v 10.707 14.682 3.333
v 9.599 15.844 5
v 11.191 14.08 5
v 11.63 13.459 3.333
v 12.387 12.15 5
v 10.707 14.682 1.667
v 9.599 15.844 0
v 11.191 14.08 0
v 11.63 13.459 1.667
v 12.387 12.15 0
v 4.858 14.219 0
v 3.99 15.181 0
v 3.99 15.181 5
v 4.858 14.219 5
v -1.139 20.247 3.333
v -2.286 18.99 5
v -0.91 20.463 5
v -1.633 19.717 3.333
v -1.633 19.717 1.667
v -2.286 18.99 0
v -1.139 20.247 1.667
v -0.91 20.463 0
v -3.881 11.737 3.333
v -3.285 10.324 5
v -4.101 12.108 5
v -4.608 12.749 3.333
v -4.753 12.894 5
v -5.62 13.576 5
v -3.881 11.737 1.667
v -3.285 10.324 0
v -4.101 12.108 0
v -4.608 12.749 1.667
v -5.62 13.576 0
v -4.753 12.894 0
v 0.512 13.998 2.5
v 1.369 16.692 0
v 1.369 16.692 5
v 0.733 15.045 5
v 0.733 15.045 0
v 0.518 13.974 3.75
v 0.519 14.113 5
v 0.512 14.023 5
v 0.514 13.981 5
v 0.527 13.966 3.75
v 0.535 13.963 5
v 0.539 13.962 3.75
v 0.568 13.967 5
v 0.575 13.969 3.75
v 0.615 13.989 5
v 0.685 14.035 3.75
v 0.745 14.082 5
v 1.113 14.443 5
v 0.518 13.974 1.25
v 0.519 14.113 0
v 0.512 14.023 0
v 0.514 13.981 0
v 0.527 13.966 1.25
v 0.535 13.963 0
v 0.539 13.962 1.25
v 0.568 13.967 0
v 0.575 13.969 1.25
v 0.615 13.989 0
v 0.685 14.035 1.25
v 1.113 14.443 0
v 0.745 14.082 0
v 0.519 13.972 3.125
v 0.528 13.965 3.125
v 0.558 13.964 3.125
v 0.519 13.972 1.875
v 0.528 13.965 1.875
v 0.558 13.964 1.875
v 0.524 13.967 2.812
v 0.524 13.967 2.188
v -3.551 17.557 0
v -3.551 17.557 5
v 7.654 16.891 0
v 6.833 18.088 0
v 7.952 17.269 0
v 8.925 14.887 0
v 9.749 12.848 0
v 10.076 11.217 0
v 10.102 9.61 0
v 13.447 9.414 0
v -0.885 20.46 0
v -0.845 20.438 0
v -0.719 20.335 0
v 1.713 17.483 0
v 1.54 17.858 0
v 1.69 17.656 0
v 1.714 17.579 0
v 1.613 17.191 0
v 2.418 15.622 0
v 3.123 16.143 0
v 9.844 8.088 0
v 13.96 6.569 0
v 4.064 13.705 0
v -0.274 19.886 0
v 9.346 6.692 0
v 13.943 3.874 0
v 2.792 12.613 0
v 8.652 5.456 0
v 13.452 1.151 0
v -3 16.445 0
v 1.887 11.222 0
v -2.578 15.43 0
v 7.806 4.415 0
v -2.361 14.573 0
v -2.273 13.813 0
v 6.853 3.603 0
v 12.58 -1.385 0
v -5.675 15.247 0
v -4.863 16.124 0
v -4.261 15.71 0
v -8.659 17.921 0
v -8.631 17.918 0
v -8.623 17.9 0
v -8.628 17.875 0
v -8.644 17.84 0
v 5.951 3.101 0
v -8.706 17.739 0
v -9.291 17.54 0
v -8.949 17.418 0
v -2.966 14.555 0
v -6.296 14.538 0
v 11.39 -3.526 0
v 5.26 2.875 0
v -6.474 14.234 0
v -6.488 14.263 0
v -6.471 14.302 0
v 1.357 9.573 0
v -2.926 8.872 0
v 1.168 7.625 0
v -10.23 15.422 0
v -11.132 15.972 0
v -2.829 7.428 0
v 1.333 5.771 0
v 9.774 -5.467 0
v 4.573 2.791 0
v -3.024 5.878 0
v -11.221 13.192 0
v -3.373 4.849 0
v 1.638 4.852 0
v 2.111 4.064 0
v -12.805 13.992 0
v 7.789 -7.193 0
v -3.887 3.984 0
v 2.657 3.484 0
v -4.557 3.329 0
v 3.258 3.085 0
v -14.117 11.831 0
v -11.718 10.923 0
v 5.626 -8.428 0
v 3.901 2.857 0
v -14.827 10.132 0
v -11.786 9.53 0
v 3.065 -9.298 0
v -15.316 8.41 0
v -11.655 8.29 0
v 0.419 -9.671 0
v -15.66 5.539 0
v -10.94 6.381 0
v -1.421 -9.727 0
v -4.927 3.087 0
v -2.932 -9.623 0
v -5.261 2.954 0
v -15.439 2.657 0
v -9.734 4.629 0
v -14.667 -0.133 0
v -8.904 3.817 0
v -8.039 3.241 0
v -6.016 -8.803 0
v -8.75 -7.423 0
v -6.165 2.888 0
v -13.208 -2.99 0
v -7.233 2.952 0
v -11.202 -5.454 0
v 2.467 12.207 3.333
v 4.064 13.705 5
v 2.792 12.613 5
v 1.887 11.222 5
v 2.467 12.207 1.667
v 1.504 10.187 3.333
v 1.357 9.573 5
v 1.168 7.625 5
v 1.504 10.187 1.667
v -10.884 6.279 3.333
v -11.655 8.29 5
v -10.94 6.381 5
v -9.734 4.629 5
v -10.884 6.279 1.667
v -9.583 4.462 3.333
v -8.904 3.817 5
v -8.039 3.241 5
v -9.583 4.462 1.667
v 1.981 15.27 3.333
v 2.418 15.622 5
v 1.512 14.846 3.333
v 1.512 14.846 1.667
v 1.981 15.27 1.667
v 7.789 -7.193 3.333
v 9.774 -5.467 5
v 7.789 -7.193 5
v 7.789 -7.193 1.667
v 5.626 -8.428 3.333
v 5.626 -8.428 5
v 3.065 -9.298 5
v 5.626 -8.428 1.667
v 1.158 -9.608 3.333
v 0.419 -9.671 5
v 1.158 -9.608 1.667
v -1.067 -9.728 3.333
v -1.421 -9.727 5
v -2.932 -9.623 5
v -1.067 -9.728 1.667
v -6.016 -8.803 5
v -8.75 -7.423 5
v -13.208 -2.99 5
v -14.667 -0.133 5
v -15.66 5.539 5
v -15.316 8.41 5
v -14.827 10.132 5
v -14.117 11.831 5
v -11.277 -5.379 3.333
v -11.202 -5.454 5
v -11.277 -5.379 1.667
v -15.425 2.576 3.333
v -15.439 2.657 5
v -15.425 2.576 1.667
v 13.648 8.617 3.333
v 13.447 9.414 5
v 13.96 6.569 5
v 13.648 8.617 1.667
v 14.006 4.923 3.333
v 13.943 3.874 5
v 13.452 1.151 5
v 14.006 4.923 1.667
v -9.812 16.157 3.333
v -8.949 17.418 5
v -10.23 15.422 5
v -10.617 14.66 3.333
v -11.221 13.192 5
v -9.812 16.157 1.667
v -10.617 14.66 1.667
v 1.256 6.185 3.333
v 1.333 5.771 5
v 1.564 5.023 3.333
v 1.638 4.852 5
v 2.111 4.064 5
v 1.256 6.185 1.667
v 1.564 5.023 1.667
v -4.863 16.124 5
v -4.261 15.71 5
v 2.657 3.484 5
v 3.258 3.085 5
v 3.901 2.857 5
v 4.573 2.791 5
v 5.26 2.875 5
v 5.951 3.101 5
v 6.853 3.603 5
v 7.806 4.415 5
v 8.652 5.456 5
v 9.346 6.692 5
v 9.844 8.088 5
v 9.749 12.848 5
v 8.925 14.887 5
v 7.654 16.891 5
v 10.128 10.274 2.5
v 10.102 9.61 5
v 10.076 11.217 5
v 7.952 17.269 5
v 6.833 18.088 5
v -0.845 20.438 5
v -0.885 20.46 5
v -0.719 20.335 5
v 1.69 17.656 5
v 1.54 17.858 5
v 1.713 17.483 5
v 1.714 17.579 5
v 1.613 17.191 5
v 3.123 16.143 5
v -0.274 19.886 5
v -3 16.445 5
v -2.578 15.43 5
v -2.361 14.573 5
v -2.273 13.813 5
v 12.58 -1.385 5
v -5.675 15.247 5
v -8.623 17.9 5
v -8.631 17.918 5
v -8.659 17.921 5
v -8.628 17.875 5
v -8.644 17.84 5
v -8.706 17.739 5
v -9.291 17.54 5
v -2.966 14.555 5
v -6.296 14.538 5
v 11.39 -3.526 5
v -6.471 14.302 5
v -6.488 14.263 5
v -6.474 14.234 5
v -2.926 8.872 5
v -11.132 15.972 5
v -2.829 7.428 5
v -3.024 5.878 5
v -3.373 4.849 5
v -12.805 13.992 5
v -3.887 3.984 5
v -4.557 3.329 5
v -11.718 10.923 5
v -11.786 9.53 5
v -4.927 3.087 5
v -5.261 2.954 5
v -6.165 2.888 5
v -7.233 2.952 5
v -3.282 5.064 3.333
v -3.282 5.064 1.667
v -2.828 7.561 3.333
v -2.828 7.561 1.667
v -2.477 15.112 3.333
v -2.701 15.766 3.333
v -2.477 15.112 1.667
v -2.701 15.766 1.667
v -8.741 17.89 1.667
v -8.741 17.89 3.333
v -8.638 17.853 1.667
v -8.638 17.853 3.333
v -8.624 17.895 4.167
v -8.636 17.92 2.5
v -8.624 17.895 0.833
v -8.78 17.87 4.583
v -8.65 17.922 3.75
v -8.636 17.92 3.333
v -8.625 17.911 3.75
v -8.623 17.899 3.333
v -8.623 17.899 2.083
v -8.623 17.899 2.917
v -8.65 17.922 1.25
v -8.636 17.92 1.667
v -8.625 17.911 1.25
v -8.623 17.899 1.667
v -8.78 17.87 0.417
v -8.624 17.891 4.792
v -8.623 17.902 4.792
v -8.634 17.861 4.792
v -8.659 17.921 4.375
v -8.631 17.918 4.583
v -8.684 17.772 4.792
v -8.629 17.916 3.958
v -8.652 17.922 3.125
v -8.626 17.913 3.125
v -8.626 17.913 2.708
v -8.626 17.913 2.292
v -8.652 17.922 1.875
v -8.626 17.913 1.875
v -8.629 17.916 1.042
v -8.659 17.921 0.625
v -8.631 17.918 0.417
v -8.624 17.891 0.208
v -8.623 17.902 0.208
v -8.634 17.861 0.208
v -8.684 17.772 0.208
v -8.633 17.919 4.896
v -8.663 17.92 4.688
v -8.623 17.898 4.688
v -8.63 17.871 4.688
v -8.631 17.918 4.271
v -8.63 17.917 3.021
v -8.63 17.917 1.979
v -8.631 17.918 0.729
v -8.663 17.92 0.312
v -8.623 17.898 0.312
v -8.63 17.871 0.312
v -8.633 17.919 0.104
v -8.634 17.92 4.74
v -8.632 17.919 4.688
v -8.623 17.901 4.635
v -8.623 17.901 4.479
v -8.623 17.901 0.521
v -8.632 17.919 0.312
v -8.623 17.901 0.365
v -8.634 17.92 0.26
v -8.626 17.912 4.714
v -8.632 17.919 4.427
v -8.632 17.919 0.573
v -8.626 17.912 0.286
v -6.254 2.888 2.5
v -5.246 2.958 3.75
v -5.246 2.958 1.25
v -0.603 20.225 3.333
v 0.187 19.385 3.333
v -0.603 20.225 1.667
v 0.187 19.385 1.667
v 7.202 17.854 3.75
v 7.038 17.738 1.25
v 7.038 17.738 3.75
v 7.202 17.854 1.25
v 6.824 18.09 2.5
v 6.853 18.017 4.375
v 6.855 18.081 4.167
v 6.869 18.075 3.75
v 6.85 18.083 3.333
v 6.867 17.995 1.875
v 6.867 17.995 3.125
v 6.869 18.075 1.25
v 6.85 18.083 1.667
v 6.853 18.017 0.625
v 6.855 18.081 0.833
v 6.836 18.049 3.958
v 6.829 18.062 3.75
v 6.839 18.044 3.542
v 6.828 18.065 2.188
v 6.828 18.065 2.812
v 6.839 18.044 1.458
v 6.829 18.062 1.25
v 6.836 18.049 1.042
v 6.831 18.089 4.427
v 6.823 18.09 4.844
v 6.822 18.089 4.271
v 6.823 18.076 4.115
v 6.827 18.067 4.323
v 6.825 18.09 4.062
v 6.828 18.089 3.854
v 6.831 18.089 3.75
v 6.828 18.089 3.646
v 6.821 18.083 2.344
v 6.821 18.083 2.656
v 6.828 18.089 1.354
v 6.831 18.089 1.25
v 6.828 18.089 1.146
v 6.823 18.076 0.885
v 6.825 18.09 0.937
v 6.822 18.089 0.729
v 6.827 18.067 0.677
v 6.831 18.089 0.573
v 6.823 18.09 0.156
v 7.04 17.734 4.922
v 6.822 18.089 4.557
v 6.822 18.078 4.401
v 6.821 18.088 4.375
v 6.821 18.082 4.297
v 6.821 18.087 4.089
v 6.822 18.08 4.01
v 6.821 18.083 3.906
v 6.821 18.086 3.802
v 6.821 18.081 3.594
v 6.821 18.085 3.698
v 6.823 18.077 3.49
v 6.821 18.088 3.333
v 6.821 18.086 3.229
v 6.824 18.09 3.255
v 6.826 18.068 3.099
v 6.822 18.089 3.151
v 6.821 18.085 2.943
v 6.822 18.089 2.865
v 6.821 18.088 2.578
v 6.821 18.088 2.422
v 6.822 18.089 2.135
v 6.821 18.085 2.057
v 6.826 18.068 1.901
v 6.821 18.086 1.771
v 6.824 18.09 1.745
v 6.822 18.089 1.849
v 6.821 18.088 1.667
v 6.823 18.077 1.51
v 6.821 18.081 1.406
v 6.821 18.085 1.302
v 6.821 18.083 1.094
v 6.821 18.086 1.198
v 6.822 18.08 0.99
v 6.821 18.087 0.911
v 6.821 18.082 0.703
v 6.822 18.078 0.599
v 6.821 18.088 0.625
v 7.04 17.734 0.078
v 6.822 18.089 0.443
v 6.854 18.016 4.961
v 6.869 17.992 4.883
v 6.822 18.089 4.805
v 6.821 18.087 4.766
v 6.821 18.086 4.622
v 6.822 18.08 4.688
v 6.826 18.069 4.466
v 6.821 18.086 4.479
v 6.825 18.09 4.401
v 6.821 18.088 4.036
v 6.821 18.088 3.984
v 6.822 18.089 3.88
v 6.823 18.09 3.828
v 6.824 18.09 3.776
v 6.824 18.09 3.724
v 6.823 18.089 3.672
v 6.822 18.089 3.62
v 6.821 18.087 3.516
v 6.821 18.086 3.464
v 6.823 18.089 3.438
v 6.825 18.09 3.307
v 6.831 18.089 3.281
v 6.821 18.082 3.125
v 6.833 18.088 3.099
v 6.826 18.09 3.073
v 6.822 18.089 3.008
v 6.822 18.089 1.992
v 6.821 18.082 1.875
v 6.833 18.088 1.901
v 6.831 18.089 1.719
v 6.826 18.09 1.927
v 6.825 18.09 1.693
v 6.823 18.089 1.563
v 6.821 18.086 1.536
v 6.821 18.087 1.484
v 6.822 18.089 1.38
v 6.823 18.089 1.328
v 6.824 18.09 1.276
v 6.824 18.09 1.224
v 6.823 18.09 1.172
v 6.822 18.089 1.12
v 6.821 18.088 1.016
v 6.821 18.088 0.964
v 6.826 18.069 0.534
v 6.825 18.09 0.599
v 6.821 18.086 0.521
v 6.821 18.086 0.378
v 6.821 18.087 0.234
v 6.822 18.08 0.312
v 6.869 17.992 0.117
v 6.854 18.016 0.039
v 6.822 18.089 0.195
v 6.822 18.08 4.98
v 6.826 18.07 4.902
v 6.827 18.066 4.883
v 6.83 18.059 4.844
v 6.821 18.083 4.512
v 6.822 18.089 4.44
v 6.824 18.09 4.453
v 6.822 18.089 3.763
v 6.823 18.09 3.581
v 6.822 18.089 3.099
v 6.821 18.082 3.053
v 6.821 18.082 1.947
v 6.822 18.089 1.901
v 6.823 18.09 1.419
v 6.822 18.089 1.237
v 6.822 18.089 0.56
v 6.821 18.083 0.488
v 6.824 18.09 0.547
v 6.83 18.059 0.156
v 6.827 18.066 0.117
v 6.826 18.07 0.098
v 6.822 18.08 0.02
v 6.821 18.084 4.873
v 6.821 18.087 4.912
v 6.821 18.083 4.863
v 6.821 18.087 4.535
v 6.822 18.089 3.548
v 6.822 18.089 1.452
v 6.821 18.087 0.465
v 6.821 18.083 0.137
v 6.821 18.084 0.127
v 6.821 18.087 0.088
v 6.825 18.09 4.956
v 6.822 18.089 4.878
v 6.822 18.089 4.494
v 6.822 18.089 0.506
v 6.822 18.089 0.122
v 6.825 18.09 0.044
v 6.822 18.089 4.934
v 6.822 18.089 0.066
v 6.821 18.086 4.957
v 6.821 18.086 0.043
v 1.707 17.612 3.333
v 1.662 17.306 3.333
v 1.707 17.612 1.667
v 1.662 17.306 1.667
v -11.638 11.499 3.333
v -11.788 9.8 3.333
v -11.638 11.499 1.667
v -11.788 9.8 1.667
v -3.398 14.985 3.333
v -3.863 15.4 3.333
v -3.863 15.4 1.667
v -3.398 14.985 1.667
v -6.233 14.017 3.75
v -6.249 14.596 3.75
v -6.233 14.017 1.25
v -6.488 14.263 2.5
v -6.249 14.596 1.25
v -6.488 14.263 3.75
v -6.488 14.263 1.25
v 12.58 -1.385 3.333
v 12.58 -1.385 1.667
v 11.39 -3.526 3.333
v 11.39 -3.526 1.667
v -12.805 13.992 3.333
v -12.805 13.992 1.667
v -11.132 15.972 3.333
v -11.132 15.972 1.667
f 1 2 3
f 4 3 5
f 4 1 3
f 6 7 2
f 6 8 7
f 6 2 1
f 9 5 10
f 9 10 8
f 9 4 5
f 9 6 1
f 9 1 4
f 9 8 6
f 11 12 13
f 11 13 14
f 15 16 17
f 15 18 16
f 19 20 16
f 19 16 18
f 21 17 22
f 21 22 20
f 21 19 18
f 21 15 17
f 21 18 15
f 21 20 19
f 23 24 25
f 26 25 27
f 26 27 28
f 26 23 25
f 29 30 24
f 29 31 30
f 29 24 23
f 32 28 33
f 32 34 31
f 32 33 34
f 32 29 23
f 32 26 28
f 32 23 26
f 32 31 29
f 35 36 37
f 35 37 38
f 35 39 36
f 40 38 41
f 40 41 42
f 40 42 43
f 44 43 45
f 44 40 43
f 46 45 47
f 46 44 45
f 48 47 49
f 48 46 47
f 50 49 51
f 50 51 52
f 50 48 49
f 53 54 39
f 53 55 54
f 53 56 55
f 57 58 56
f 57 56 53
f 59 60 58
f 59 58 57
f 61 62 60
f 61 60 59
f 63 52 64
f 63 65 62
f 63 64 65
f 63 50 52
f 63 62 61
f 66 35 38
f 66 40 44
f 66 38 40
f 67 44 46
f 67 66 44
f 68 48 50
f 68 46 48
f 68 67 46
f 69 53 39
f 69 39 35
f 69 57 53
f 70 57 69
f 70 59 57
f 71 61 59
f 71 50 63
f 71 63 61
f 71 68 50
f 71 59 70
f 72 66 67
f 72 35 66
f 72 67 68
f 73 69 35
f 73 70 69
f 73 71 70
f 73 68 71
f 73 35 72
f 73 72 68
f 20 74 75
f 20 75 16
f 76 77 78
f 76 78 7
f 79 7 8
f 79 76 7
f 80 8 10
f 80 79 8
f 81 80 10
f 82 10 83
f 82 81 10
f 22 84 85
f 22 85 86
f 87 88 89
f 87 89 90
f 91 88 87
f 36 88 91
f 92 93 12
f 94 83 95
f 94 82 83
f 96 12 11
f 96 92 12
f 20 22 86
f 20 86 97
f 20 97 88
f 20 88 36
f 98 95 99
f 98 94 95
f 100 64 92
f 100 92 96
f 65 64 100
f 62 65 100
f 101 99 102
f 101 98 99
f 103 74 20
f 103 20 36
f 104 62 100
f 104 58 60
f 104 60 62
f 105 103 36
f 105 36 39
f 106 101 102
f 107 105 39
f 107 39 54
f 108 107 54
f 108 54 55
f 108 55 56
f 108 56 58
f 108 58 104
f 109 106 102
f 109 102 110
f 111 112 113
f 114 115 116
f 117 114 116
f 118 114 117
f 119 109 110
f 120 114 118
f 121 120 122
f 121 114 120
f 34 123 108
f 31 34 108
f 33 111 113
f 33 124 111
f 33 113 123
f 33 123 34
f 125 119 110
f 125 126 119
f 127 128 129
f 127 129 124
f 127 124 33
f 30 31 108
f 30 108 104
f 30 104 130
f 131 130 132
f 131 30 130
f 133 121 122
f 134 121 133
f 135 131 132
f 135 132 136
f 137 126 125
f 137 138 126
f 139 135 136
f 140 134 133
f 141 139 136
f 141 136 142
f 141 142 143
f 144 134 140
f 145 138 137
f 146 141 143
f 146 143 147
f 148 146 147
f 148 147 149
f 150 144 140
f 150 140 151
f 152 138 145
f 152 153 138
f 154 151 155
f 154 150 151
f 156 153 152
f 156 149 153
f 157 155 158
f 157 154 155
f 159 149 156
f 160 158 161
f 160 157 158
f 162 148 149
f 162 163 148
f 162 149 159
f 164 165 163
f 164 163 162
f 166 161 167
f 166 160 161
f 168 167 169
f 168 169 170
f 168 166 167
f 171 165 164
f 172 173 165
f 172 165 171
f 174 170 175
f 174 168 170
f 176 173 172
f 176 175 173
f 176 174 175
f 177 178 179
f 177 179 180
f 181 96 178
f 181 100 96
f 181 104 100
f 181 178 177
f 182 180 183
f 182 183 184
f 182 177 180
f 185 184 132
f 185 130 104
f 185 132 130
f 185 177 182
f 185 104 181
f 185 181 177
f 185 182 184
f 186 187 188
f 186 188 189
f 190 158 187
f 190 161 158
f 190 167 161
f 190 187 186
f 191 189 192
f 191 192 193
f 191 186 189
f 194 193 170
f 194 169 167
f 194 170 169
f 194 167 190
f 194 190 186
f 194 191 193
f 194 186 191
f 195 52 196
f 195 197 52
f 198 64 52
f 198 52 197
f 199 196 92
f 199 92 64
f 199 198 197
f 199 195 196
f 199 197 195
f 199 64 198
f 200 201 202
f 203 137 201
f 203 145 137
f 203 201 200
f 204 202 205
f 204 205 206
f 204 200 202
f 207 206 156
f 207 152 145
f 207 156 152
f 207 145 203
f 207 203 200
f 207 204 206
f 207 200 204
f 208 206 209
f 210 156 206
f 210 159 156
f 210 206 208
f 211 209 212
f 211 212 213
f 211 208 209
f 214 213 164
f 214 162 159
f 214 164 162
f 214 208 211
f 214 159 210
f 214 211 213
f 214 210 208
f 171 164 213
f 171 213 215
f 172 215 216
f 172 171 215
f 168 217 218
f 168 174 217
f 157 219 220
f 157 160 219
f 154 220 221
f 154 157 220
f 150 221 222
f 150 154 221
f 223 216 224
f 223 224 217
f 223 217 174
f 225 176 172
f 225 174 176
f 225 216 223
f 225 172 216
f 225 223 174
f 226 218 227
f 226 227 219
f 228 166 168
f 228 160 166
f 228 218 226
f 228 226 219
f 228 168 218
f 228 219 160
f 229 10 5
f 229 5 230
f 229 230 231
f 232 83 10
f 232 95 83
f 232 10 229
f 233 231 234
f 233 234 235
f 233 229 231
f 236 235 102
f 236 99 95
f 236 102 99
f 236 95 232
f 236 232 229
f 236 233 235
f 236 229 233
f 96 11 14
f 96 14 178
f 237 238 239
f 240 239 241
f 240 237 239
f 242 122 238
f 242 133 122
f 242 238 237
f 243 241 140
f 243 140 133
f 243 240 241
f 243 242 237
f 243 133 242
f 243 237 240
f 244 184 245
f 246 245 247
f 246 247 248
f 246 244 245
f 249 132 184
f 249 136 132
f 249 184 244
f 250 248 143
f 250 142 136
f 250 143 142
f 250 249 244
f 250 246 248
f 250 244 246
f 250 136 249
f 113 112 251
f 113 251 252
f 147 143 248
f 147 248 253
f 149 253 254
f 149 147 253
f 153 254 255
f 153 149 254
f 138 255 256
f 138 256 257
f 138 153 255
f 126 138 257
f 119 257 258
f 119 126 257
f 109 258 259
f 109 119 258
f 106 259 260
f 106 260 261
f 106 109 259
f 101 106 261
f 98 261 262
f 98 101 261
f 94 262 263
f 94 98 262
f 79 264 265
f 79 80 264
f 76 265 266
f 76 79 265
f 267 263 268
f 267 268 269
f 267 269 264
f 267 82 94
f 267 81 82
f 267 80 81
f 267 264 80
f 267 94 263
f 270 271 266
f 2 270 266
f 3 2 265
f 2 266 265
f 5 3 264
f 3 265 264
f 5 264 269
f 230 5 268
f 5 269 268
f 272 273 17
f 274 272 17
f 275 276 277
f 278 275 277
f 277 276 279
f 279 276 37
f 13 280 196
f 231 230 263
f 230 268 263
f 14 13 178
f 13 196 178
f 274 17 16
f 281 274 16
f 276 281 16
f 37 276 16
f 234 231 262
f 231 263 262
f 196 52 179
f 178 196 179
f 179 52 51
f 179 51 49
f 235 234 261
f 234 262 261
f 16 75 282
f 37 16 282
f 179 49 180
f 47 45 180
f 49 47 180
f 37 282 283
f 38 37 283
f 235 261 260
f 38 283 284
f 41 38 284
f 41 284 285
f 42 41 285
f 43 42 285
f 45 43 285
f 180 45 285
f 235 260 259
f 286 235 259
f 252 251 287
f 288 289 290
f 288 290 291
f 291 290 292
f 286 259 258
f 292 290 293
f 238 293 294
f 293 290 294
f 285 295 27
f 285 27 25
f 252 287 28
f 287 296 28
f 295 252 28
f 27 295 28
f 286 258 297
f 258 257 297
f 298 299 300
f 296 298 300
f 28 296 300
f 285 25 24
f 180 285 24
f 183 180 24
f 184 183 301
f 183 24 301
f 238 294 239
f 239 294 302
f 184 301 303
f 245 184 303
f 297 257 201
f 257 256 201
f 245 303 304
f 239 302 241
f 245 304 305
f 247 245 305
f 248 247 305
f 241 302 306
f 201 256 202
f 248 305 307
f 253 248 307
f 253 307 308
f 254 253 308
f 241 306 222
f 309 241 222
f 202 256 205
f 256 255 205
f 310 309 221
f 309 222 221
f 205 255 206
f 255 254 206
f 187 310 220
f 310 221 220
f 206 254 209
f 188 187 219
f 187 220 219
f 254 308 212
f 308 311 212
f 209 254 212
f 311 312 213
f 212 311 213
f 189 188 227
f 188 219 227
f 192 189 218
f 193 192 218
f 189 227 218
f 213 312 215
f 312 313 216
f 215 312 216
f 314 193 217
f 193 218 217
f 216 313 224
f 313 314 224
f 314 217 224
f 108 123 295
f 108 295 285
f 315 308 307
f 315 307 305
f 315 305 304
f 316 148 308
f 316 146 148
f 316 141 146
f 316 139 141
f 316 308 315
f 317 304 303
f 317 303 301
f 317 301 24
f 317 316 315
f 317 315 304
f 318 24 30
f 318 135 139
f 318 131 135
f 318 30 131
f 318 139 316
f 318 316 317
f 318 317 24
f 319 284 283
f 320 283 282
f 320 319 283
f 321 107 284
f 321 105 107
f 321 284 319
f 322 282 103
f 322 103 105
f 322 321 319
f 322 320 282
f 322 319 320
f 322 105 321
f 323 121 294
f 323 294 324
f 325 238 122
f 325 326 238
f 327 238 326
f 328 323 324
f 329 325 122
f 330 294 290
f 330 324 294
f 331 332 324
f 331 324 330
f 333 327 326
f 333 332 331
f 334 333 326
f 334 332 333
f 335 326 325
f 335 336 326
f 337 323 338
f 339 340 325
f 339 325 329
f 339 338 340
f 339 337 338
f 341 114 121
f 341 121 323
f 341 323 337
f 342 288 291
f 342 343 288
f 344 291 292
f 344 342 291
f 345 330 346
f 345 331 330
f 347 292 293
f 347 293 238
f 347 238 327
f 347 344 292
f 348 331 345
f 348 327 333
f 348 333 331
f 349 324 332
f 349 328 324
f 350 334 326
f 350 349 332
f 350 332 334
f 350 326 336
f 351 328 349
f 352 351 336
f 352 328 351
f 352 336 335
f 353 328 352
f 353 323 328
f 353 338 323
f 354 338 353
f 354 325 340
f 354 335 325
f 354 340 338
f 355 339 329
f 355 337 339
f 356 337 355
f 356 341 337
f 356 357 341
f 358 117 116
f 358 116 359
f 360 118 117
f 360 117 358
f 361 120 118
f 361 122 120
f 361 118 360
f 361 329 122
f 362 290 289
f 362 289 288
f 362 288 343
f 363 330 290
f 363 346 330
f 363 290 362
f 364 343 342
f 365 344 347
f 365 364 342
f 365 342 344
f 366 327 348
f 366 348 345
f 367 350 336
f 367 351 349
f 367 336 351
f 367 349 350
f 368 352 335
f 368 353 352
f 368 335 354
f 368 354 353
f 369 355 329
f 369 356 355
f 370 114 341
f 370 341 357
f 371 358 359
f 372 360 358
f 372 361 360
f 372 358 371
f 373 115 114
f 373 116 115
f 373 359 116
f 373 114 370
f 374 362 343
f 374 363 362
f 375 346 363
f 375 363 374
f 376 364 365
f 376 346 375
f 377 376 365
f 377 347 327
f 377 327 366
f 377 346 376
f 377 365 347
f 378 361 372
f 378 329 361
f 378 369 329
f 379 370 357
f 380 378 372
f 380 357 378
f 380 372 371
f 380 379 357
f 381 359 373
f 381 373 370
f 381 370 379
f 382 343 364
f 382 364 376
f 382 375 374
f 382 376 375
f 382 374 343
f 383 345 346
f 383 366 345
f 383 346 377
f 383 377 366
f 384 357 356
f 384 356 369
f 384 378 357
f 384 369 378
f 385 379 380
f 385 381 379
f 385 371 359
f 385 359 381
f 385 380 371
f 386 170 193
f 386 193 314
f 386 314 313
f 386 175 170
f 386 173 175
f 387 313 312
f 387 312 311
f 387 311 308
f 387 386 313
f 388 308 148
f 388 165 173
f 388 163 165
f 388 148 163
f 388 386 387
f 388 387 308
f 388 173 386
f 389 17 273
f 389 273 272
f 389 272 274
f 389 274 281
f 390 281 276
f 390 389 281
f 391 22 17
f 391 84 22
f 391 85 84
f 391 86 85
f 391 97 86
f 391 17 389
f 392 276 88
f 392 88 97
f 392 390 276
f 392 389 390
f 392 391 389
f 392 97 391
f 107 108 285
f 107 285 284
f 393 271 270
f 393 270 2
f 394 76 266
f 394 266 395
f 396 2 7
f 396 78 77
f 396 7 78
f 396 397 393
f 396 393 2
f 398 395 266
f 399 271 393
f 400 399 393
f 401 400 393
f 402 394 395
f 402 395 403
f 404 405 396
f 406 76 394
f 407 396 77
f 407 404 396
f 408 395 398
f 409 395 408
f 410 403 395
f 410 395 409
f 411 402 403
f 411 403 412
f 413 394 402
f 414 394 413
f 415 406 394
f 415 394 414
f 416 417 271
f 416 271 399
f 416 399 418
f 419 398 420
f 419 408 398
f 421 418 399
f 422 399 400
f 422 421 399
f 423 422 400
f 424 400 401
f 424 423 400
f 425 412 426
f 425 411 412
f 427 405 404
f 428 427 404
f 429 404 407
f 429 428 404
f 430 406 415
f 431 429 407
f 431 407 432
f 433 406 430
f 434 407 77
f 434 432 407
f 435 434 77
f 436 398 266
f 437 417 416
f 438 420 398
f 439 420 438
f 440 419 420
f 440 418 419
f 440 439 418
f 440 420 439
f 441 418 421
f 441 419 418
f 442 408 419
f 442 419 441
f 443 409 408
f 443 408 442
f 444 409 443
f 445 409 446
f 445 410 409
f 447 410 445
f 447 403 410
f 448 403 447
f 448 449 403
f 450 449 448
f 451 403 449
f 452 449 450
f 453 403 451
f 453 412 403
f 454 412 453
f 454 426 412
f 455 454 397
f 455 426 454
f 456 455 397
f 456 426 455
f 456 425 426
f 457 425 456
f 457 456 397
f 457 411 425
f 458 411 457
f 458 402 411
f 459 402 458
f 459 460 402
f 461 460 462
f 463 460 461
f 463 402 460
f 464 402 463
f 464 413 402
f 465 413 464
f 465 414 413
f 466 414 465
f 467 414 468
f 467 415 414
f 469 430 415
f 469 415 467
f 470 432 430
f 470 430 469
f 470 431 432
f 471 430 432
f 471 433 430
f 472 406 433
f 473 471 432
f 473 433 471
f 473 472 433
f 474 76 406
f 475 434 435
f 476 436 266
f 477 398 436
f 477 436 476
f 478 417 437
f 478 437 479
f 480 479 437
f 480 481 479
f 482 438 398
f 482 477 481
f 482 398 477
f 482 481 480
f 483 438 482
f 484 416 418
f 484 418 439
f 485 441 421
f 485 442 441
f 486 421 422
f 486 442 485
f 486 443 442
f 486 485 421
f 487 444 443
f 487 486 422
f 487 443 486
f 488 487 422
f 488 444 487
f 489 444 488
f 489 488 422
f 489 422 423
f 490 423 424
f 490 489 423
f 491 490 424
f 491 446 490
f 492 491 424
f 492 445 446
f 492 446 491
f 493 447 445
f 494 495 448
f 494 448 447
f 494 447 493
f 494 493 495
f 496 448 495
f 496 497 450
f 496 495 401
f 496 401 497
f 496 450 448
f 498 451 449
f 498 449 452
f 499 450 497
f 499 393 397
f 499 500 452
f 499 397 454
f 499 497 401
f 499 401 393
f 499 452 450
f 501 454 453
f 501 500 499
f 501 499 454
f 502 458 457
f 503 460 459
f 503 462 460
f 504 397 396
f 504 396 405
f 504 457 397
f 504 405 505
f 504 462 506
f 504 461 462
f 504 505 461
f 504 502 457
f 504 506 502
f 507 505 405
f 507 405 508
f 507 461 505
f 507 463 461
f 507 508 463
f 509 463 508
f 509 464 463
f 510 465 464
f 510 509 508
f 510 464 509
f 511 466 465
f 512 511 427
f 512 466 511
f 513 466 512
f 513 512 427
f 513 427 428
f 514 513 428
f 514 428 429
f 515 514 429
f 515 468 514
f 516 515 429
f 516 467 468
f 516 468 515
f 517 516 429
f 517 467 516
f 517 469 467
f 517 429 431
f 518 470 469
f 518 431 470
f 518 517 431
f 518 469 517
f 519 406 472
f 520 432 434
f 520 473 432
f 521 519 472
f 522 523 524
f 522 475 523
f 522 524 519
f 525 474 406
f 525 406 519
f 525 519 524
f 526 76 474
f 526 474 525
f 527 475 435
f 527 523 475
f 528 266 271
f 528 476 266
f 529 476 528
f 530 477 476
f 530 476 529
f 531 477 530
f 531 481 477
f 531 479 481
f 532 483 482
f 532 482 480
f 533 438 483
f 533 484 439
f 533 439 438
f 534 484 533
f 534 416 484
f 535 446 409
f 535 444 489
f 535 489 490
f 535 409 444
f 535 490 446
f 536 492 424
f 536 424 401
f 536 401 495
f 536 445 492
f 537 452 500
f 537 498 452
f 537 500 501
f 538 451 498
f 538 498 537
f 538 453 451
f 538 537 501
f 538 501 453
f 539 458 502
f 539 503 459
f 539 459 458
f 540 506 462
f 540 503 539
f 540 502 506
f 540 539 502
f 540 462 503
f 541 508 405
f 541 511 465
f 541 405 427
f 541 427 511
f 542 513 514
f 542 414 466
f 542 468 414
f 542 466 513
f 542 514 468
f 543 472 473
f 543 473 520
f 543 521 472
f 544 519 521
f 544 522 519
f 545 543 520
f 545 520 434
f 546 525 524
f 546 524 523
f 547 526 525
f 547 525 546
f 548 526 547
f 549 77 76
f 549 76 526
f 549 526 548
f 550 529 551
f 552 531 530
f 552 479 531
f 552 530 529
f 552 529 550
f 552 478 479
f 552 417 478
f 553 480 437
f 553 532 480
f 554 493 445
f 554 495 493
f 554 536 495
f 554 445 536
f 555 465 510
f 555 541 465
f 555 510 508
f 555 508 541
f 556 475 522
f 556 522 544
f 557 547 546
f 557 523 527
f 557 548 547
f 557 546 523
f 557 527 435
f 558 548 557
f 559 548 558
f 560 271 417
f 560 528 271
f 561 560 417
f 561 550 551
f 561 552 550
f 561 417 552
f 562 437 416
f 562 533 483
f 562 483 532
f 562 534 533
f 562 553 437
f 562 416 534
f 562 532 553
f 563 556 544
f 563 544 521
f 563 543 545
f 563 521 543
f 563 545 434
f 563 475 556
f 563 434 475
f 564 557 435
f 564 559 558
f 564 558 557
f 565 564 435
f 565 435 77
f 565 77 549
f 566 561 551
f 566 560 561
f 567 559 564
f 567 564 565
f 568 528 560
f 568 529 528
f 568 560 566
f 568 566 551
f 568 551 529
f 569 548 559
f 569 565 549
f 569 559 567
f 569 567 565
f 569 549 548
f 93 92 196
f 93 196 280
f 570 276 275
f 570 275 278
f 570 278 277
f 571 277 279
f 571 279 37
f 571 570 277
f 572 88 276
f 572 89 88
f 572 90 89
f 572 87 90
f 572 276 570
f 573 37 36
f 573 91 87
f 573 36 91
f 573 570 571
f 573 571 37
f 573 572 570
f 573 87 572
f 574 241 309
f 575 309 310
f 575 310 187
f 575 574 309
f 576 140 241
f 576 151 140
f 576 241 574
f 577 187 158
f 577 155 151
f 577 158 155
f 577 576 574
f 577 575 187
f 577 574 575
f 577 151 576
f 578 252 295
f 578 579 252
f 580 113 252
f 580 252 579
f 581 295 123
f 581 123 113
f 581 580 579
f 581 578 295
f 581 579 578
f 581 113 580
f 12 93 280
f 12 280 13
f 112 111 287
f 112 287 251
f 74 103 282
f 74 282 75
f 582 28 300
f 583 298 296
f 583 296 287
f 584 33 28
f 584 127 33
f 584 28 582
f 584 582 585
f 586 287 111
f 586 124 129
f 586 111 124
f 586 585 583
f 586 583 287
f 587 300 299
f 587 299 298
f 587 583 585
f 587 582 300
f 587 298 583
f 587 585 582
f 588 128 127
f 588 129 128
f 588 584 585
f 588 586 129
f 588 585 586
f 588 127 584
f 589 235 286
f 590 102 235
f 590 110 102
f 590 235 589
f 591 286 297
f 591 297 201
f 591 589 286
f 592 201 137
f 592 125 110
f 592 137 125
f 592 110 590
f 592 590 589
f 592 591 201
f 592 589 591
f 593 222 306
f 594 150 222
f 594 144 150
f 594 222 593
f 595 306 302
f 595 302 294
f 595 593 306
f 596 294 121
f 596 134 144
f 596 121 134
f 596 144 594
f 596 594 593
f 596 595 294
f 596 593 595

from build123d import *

# Parameters (mm, degrees)
EXTRUDE_DEPTH = 5


with BuildPart() as part:
    # path3417 → Extrude (new body)
    with BuildSketch(Plane(origin=(-1.246917, 5.322024, 0), x_dir=(0, -1, 0), z_dir=(0, 0, -1))):
        with BuildLine():
            add(Edge.make_bspline(
                [(14.944774, 1.685063), (13.361214, 11.710116), (2.590516, 17.325398), (-6.508579, 12.869733)],
                knots=[0, 0, 0, 0, 1, 1, 1, 1], degree=3))
            add(Edge.make_bspline(
                [(-6.508579, 12.869733), (-8.68412, 11.804406), (-10.932469, 9.903823), (-12.217743, 8.043626)],
                knots=[0, 0, 0, 0, 1, 1, 1, 1], degree=3))
            add(Edge.make_bspline(
                [(-12.217743, 8.043626), (-12.757815, 7.261966), (-12.732993, 7.192494), (-12.095877, 7.70256)],
                knots=[0, 0, 0, 0, 1, 1, 1, 1], degree=3))
            add(Edge.make_bspline(
                [(-12.095877, 7.70256), (-11.042002, 8.546283), (-9.235995, 9.517066), (-7.869486, 9.974373)],
                knots=[0, 0, 0, 0, 1, 1, 1, 1], degree=3))
            add(Edge.make_bspline(
                [(-7.869486, 9.974373), (-6.244405, 10.518212), (-4.318684, 10.688692), (-2.968003, 10.408295)],
                knots=[0, 0, 0, 0, 1, 1, 1, 1], degree=3))
            add(Edge.make_bspline(
                [(-2.968003, 10.408295), (-0.992961, 9.998274), (1.291337, 8.36226), (2.080555, 6.792512)],
                knots=[0, 0, 0, 0, 1, 1, 1, 1], degree=3))
            add(Edge.make_bspline(
                [(2.080555, 6.792512), (2.365582, 6.225596), (2.434083, 5.879704), (2.434083, 5.007338)],
                knots=[0, 0, 0, 0, 1, 1, 1, 1], degree=3))
            add(Edge.make_bspline(
                [(2.434083, 5.007338), (2.434083, 4.021519), (2.394855, 3.870651), (1.992885, 3.310406)],
                knots=[0, 0, 0, 0, 1, 1, 1, 1], degree=3))
            add(Edge.make_bspline(
                [(1.992885, 3.310406), (0.804566, 1.654194), (-2.270321, 1.094934), (-5.002311, 2.03812)],
                knots=[0, 0, 0, 0, 1, 1, 1, 1], degree=3))
            add(Edge.make_bspline(
                [(-5.002311, 2.03812), (-6.685716, 2.619301), (-7.449217, 3.167506), (-8.254276, 4.373089)],
                knots=[0, 0, 0, 0, 1, 1, 1, 1], degree=3))
            add(Edge.make_bspline(
                [(-8.254276, 4.373089), (-8.572998, 4.850377), (-8.881842, 5.240885), (-8.940601, 5.240885)],
                knots=[0, 0, 0, 0, 1, 1, 1, 1], degree=3))
            add(Edge.make_bspline(
                [(-8.940601, 5.240885), (-8.999357, 5.240885), (-9.442299, 4.875312), (-9.924916, 4.428495)],
                knots=[0, 0, 0, 0, 1, 1, 1, 1], degree=3))
            add(Edge.make_bspline(
                [(-9.924916, 4.428495), (-10.802398, 3.616098)],
                knots=[0, 0, 4.237125, 4.237125], degree=1))
            add(Edge.make_bspline(
                [(-10.802398, 3.616098), (-10.388237, 3.014386)],
                knots=[0, 0, 2.58828, 2.58828], degree=1))
            add(Edge.make_bspline(
                [(-10.388237, 3.014386), (-10.160447, 2.683444), (-9.640363, 2.100627), (-9.232489, 1.719243)],
                knots=[0, 0, 0, 0, 1, 1, 1, 1], degree=3))
            add(Edge.make_bspline(
                [(-9.232489, 1.719243), (-8.490905, 1.025809)],
                knots=[0, 0, 3.597456, 3.597456], degree=1))
            add(Edge.make_bspline(
                [(-8.490905, 1.025809), (-9.25049, 1.114131)],
                knots=[0, 0, 2.709573, 2.709573], degree=1))
            add(Edge.make_bspline(
                [(-9.25049, 1.114131), (-9.701616, 1.166587), (-10.461855, 1.42617), (-11.122633, 1.75337)],
                knots=[0, 0, 0, 0, 1, 1, 1, 1], degree=3))
            add(Edge.make_bspline(
                [(-11.122633, 1.75337), (-12.235196, 2.304281)],
                knots=[0, 0, 4.398982, 4.398982], degree=1))
            add(Edge.make_bspline(
                [(-12.235196, 2.304281), (-13.668026, 1.038995)],
                knots=[0, 0, 6.773145, 6.773145], degree=1))
            add(Edge.make_bspline(
                [(-13.668026, 1.038995), (-14.456078, 0.343091), (-15.119114, -0.275921), (-15.14143, -0.336582)],
                knots=[0, 0, 0, 0, 1, 1, 1, 1], degree=3))
            add(Edge.make_bspline(
                [(-15.14143, -0.336582), (-15.17537, -0.428849), (-14.435121, -1.124953), (-12.535765, -2.786827)],
                knots=[0, 0, 0, 0, 1, 1, 1, 1], degree=3))
            add(Edge.make_bspline(
                [(-12.535765, -2.786827), (-12.238224, -3.047171), (-12.219061, -3.044363), (-11.370103, -2.615806)],
                knots=[0, 0, 0, 0, 1, 1, 1, 1], degree=3))
            add(Edge.make_bspline(
                [(-11.370103, -2.615806), (-10.558344, -2.20603), (-9.152731, -1.758945), (-8.676181, -1.758945)],
                knots=[0, 0, 0, 0, 1, 1, 1, 1], degree=3))
            add(Edge.make_bspline(
                [(-8.676181, -1.758945), (-8.555035, -1.758945), (-8.747863, -2.019529), (-9.120904, -2.359937)],
                knots=[0, 0, 0, 0, 1, 1, 1, 1], degree=3))
            add(Edge.make_bspline(
                [(-9.120904, -2.359937), (-9.483139, -2.690487), (-10.013858, -3.277862), (-10.300277, -3.665221)],
                knots=[0, 0, 0, 0, 1, 1, 1, 1], degree=3))
            add(Edge.make_bspline(
                [(-10.300277, -3.665221), (-10.821031, -4.369498)],
                knots=[0, 0, 3.103562, 3.103562], degree=1))
            add(Edge.make_bspline(
                [(-10.821031, -4.369498), (-9.858924, -5.237266)],
                knots=[0, 0, 4.590835, 4.590835], degree=1))
            add(Edge.make_bspline(
                [(-9.858924, -5.237266), (-8.896817, -6.105032)],
                knots=[0, 0, 4.590828, 4.590828], degree=1))
            add(Edge.make_bspline(
                [(-8.896817, -6.105032), (-8.382543, -5.310746)],
                knots=[0, 0, 3.352815, 3.352815], degree=1))
            add(Edge.make_bspline(
                [(-8.382543, -5.310746), (-7.14131, -3.393675), (-5.140431, -2.440591), (-2.303177, -2.414948)],
                knots=[0, 0, 0, 0, 1, 1, 1, 1], degree=3))
            add(Edge.make_bspline(
                [(-2.303177, -2.414948), (-0.69792, -2.400442), (0.373952, -2.684174), (1.258046, -3.357641)],
                knots=[0, 0, 0, 0, 1, 1, 1, 1], degree=3))
            add(Edge.make_bspline(
                [(1.258046, -3.357641), (4.734195, -6.005616), (0.574947, -11.374877), (-4.952423, -11.374877)],
                knots=[0, 0, 0, 0, 1, 1, 1, 1], degree=3))
            add(Edge.make_bspline(
                [(-4.952423, -11.374877), (-7.141575, -11.374877), (-9.418056, -10.523893), (-11.569287, -8.901397)],
                knots=[0, 0, 0, 0, 1, 1, 1, 1], degree=3))
            add(Edge.make_bspline(
                [(-11.569287, -8.901397), (-12.228349, -8.404319), (-12.76758, -8.030538), (-12.76758, -8.070769)],
                knots=[0, 0, 0, 0, 1, 1, 1, 1], degree=3))
            add(Edge.make_bspline(
                [(-12.76758, -8.070769), (-12.76758, -8.223265), (-11.390727, -9.924464), (-10.52192, -10.845445)],
                knots=[0, 0, 0, 0, 1, 1, 1, 1], degree=3))
            add(Edge.make_bspline(
                [(-10.52192, -10.845445), (-9.383264, -12.052476), (-8.188098, -12.95467), (-6.828323, -13.633617)],
                knots=[0, 0, 0, 0, 1, 1, 1, 1], degree=3))
            add(Edge.make_bspline(
                [(-6.828323, -13.633617), (-3.402679, -15.344068), (0.387916, -15.711199), (4.170569, -14.698896)],
                knots=[0, 0, 0, 0, 1, 1, 1, 1], degree=3))
            add(Edge.make_bspline(
                [(4.170569, -14.698896), (6.968316, -13.950169), (8.884464, -12.885506), (10.789298, -11.021349)],
                knots=[0, 0, 0, 0, 1, 1, 1, 1], degree=3))
            add(Edge.make_bspline(
                [(10.789298, -11.021349), (12.802533, -9.051105), (13.890101, -7.146319), (14.620408, -4.311487)],
                knots=[0, 0, 0, 0, 1, 1, 1, 1], degree=3))
            add(Edge.make_bspline(
                [(14.620408, -4.311487), (15.01224, -2.790513), (15.17537, 0.225249), (14.944774, 1.685063)],
                knots=[0, 0, 0, 0, 1, 1, 1, 1], degree=3))
        make_face()
    extrude(amount=-EXTRUDE_DEPTH)


solid = part.part
